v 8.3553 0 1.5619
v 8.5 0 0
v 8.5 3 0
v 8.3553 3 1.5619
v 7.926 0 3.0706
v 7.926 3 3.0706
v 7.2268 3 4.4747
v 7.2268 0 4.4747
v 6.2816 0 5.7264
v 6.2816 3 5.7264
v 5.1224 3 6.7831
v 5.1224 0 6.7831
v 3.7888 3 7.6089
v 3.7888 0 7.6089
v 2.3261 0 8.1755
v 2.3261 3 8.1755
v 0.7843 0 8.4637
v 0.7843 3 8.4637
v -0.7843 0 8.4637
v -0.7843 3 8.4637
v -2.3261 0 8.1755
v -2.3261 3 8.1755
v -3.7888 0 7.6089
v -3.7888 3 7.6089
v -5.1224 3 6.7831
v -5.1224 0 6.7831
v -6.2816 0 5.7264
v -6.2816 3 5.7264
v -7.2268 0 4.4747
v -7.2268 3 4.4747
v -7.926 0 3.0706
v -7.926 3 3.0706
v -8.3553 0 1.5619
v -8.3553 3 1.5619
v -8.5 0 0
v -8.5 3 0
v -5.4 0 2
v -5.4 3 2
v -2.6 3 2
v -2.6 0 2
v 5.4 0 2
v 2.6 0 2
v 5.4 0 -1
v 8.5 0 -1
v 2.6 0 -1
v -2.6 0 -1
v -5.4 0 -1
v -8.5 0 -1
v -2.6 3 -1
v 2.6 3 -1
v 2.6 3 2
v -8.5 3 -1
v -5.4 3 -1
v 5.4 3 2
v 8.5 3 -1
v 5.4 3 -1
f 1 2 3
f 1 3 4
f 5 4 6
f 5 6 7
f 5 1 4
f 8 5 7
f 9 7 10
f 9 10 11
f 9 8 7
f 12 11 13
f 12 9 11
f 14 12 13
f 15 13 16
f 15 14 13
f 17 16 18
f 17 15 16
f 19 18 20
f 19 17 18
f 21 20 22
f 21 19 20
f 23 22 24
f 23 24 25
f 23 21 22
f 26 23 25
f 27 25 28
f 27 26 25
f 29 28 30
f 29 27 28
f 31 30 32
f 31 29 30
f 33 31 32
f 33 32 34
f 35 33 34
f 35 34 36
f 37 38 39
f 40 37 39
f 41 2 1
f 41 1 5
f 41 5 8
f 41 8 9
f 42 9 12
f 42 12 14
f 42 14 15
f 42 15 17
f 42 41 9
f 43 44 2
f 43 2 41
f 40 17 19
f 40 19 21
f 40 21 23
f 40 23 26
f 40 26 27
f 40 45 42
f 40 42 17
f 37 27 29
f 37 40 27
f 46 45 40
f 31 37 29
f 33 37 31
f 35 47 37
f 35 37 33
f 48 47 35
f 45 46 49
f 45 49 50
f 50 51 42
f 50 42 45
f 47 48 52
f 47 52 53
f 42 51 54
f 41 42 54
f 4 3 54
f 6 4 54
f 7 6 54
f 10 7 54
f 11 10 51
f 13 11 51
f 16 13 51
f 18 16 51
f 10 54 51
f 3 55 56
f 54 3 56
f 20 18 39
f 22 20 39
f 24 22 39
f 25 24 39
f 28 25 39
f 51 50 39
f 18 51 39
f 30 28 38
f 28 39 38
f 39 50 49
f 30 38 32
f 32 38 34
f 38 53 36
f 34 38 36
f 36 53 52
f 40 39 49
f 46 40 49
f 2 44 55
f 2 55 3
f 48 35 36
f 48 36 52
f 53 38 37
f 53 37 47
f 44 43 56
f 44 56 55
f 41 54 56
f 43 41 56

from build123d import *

# Parameters (mm, degrees)
BOSS_EXTRUDE1_DEPTH = 3
SKETCH2_W           = 2.8
SKETCH2_H           = 3
CUT_EXTRUDE1_DEPTH  = 13.389511693


with BuildPart() as part:
    # Sketch1 → Boss-Extrude1 (new body)
    with BuildSketch(Plane(origin=(0, 0, 0), x_dir=(1, 0, 0), z_dir=(0, 1, 0))):
        with BuildLine():
            Line((-8.5, 0), (-8.5, 1))
            Line((-8.5, 1), (8.5, 1))
            Line((8.5, 1), (8.5, 0))
            ThreePointArc((8.5, 0), (0, -8.5), (-8.5, 0))
        make_face()
    extrude(amount=BOSS_EXTRUDE1_DEPTH)

    # Sketch2 → Cut-Extrude1 (cut, through all)
    with BuildSketch(Plane(origin=(0, 3, 0), x_dir=(1, 0, 0), z_dir=(0, 1, 0))):
        with Locations((-4, -0.5)):
            Rectangle(SKETCH2_W, SKETCH2_H)
        with Locations((4, -0.5)):
            Rectangle(SKETCH2_W, SKETCH2_H)
    extrude(amount=-CUT_EXTRUDE1_DEPTH, mode=Mode.SUBTRACT)


solid = part.part
